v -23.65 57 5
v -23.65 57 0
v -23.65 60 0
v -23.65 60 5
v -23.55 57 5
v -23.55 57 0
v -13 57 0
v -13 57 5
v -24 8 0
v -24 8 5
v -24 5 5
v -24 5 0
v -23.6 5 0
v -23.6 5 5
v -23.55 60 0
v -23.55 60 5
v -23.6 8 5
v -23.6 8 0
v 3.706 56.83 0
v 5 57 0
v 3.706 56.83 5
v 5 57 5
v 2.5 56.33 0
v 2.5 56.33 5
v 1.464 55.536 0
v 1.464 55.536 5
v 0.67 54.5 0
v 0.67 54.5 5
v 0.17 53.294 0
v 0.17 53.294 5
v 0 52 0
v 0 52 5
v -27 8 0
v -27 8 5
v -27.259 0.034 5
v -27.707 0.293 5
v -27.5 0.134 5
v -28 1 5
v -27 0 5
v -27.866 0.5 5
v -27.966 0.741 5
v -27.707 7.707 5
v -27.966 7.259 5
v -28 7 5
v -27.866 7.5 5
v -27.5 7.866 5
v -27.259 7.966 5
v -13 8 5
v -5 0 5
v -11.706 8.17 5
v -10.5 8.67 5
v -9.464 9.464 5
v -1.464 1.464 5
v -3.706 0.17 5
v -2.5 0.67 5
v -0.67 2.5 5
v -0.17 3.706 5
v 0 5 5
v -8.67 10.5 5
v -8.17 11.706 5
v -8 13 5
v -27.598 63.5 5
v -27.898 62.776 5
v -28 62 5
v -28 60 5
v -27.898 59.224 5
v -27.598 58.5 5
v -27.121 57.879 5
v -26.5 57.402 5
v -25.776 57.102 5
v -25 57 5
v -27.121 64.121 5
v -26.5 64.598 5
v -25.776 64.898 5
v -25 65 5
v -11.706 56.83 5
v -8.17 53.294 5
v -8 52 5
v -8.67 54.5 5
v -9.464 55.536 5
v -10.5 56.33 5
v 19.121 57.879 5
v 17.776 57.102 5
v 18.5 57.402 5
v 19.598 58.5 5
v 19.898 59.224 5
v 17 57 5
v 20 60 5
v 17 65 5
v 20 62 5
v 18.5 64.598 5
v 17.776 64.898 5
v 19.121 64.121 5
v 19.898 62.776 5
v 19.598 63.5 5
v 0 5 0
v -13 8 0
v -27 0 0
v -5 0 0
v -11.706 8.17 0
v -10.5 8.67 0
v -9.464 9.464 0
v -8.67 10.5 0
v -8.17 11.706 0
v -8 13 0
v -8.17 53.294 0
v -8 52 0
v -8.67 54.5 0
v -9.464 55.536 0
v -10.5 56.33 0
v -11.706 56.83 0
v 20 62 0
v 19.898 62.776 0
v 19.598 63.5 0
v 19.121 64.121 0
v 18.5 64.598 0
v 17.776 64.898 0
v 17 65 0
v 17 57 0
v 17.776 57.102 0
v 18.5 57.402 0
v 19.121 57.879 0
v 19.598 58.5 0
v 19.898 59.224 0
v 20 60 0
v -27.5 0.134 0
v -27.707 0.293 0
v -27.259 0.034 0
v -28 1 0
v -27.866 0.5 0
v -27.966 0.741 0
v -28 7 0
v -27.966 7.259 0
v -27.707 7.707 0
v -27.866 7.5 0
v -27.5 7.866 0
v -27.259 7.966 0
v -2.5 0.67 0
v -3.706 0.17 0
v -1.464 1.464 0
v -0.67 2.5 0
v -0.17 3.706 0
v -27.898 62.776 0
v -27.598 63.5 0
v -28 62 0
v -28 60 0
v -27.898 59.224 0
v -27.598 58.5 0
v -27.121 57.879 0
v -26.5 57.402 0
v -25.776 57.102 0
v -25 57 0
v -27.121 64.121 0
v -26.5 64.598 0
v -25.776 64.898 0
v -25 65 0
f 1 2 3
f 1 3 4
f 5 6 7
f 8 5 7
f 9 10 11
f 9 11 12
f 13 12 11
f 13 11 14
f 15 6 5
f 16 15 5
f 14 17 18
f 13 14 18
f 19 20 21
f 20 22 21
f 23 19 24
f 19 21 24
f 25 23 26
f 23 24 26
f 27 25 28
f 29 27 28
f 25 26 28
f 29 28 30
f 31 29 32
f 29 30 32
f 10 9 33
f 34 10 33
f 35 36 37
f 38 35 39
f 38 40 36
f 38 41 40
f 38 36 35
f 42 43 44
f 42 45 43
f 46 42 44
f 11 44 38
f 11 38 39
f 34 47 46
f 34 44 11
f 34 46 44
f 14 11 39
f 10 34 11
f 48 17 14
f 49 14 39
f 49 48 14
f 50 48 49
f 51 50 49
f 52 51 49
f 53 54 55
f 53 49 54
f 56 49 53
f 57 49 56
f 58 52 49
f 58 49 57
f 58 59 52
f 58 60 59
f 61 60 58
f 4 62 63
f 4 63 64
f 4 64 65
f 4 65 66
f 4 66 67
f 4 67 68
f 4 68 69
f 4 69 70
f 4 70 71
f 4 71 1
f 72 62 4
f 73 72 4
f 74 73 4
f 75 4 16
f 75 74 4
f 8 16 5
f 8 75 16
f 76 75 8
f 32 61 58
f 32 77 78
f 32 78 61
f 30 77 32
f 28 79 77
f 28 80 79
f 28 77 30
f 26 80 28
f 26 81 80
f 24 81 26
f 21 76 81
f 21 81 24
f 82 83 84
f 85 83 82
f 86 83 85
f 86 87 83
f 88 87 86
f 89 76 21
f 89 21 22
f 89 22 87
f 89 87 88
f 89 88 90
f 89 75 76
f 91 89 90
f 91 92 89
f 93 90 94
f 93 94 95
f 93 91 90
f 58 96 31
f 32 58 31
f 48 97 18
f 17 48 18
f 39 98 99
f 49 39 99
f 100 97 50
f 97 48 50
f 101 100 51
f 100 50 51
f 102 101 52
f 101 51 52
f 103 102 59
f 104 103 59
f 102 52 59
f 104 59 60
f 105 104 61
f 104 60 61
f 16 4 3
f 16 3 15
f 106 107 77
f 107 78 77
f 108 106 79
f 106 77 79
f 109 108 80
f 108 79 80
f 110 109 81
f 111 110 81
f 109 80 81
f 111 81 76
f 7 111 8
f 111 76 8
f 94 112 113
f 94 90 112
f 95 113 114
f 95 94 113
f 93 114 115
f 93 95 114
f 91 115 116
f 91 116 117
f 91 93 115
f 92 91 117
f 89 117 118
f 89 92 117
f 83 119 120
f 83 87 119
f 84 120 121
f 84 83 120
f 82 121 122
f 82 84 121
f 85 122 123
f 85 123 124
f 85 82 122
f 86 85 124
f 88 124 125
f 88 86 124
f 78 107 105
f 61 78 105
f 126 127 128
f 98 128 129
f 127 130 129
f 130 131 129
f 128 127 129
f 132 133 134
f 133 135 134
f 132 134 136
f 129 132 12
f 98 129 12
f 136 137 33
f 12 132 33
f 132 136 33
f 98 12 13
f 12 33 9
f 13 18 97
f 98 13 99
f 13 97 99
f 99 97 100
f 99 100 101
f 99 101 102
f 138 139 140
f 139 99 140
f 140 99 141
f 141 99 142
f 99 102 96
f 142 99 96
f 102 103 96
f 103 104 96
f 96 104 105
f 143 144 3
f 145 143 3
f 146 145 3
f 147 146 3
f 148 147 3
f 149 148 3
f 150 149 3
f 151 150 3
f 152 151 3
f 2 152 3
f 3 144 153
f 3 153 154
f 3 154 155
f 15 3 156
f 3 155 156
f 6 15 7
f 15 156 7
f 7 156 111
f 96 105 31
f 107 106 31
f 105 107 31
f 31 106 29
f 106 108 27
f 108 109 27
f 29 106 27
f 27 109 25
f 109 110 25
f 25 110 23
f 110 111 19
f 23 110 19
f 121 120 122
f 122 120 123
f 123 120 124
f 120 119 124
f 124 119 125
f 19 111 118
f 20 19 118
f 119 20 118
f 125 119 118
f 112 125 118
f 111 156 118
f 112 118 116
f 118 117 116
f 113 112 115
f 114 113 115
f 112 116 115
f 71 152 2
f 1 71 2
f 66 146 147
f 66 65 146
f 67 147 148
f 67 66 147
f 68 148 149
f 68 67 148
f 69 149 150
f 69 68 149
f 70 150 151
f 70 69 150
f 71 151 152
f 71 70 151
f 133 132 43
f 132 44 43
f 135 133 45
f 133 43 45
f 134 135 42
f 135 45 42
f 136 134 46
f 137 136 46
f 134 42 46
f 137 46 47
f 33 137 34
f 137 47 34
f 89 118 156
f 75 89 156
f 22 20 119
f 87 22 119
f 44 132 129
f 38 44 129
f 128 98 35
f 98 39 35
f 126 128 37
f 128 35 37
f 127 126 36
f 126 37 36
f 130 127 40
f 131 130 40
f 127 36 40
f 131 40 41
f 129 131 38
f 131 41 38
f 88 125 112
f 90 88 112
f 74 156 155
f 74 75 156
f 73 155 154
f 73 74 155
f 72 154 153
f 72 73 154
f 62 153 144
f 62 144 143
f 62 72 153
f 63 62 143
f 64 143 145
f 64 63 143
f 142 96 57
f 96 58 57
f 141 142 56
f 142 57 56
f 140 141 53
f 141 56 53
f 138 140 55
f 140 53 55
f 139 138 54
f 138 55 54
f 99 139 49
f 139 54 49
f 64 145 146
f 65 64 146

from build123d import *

# Parameters (mm, degrees)
BOSS_EXTRUDE1_DEPTH = 5
SKETCH2_W           = 0.4
SKETCH2_H           = 5
CUT_EXTRUDE1_DEPTH  = 3
SKETCH3_W           = 0.1
SKETCH3_H           = 5
CUT_EXTRUDE2_DEPTH  = 3
FILLET1_R           = 5
FILLET2_R           = 3
FILLET3_R           = 1


with BuildPart() as part:
    # Sketch1 → Boss-Extrude1 (new body)
    with BuildSketch(Plane.XY):
        Polygon((0, 65), (-28, 65), (-28, 57), (-8, 57), (-8, 8), (-28, 8), (-28, 0), (0, 0), (0, 57), (20, 57), (20, 65), align=None)
    extrude(amount=BOSS_EXTRUDE1_DEPTH)

    # Sketch2 → Cut-Extrude1 (cut)
    with BuildSketch(Plane(origin=(0, 8, 0), x_dir=(1, 0, 0), z_dir=(0, 1, 0))):
        with Locations((-23.8, -2.5)):
            Rectangle(SKETCH2_W, SKETCH2_H)
    extrude(amount=-CUT_EXTRUDE1_DEPTH, mode=Mode.SUBTRACT)

    # Sketch3 → Cut-Extrude2 (cut)
    with BuildSketch(Plane.XZ.offset(-57)):
        with Locations((-23.6, 2.5)):
            Rectangle(SKETCH3_W, SKETCH3_H)
    extrude(amount=-CUT_EXTRUDE2_DEPTH, mode=Mode.SUBTRACT)

    # Fillet1
    fillet1_edges = [part.edges().sort_by_distance(p)[0] for p in [
        (0, 0, 2.5),
        (-8, 8, 2.5),
        (-8, 57, 2.5),
        (0, 57, 2.5),
    ]]
    fillet(fillet1_edges, radius=FILLET1_R)

    # Fillet2
    fillet2_edges = [part.edges().sort_by_distance(p)[0] for p in [
        (-28, 57, 2.5),
        (-28, 65, 2.5),
        (20, 65, 2.5),
        (20, 57, 2.5),
    ]]
    fillet(fillet2_edges, radius=FILLET2_R)

    # Fillet3
    fillet3_edges = [part.edges().sort_by_distance(p)[0] for p in [
        (-28, 0, 2.5),
        (-28, 8, 2.5),
    ]]
    fillet(fillet3_edges, radius=FILLET3_R)


solid = part.part
